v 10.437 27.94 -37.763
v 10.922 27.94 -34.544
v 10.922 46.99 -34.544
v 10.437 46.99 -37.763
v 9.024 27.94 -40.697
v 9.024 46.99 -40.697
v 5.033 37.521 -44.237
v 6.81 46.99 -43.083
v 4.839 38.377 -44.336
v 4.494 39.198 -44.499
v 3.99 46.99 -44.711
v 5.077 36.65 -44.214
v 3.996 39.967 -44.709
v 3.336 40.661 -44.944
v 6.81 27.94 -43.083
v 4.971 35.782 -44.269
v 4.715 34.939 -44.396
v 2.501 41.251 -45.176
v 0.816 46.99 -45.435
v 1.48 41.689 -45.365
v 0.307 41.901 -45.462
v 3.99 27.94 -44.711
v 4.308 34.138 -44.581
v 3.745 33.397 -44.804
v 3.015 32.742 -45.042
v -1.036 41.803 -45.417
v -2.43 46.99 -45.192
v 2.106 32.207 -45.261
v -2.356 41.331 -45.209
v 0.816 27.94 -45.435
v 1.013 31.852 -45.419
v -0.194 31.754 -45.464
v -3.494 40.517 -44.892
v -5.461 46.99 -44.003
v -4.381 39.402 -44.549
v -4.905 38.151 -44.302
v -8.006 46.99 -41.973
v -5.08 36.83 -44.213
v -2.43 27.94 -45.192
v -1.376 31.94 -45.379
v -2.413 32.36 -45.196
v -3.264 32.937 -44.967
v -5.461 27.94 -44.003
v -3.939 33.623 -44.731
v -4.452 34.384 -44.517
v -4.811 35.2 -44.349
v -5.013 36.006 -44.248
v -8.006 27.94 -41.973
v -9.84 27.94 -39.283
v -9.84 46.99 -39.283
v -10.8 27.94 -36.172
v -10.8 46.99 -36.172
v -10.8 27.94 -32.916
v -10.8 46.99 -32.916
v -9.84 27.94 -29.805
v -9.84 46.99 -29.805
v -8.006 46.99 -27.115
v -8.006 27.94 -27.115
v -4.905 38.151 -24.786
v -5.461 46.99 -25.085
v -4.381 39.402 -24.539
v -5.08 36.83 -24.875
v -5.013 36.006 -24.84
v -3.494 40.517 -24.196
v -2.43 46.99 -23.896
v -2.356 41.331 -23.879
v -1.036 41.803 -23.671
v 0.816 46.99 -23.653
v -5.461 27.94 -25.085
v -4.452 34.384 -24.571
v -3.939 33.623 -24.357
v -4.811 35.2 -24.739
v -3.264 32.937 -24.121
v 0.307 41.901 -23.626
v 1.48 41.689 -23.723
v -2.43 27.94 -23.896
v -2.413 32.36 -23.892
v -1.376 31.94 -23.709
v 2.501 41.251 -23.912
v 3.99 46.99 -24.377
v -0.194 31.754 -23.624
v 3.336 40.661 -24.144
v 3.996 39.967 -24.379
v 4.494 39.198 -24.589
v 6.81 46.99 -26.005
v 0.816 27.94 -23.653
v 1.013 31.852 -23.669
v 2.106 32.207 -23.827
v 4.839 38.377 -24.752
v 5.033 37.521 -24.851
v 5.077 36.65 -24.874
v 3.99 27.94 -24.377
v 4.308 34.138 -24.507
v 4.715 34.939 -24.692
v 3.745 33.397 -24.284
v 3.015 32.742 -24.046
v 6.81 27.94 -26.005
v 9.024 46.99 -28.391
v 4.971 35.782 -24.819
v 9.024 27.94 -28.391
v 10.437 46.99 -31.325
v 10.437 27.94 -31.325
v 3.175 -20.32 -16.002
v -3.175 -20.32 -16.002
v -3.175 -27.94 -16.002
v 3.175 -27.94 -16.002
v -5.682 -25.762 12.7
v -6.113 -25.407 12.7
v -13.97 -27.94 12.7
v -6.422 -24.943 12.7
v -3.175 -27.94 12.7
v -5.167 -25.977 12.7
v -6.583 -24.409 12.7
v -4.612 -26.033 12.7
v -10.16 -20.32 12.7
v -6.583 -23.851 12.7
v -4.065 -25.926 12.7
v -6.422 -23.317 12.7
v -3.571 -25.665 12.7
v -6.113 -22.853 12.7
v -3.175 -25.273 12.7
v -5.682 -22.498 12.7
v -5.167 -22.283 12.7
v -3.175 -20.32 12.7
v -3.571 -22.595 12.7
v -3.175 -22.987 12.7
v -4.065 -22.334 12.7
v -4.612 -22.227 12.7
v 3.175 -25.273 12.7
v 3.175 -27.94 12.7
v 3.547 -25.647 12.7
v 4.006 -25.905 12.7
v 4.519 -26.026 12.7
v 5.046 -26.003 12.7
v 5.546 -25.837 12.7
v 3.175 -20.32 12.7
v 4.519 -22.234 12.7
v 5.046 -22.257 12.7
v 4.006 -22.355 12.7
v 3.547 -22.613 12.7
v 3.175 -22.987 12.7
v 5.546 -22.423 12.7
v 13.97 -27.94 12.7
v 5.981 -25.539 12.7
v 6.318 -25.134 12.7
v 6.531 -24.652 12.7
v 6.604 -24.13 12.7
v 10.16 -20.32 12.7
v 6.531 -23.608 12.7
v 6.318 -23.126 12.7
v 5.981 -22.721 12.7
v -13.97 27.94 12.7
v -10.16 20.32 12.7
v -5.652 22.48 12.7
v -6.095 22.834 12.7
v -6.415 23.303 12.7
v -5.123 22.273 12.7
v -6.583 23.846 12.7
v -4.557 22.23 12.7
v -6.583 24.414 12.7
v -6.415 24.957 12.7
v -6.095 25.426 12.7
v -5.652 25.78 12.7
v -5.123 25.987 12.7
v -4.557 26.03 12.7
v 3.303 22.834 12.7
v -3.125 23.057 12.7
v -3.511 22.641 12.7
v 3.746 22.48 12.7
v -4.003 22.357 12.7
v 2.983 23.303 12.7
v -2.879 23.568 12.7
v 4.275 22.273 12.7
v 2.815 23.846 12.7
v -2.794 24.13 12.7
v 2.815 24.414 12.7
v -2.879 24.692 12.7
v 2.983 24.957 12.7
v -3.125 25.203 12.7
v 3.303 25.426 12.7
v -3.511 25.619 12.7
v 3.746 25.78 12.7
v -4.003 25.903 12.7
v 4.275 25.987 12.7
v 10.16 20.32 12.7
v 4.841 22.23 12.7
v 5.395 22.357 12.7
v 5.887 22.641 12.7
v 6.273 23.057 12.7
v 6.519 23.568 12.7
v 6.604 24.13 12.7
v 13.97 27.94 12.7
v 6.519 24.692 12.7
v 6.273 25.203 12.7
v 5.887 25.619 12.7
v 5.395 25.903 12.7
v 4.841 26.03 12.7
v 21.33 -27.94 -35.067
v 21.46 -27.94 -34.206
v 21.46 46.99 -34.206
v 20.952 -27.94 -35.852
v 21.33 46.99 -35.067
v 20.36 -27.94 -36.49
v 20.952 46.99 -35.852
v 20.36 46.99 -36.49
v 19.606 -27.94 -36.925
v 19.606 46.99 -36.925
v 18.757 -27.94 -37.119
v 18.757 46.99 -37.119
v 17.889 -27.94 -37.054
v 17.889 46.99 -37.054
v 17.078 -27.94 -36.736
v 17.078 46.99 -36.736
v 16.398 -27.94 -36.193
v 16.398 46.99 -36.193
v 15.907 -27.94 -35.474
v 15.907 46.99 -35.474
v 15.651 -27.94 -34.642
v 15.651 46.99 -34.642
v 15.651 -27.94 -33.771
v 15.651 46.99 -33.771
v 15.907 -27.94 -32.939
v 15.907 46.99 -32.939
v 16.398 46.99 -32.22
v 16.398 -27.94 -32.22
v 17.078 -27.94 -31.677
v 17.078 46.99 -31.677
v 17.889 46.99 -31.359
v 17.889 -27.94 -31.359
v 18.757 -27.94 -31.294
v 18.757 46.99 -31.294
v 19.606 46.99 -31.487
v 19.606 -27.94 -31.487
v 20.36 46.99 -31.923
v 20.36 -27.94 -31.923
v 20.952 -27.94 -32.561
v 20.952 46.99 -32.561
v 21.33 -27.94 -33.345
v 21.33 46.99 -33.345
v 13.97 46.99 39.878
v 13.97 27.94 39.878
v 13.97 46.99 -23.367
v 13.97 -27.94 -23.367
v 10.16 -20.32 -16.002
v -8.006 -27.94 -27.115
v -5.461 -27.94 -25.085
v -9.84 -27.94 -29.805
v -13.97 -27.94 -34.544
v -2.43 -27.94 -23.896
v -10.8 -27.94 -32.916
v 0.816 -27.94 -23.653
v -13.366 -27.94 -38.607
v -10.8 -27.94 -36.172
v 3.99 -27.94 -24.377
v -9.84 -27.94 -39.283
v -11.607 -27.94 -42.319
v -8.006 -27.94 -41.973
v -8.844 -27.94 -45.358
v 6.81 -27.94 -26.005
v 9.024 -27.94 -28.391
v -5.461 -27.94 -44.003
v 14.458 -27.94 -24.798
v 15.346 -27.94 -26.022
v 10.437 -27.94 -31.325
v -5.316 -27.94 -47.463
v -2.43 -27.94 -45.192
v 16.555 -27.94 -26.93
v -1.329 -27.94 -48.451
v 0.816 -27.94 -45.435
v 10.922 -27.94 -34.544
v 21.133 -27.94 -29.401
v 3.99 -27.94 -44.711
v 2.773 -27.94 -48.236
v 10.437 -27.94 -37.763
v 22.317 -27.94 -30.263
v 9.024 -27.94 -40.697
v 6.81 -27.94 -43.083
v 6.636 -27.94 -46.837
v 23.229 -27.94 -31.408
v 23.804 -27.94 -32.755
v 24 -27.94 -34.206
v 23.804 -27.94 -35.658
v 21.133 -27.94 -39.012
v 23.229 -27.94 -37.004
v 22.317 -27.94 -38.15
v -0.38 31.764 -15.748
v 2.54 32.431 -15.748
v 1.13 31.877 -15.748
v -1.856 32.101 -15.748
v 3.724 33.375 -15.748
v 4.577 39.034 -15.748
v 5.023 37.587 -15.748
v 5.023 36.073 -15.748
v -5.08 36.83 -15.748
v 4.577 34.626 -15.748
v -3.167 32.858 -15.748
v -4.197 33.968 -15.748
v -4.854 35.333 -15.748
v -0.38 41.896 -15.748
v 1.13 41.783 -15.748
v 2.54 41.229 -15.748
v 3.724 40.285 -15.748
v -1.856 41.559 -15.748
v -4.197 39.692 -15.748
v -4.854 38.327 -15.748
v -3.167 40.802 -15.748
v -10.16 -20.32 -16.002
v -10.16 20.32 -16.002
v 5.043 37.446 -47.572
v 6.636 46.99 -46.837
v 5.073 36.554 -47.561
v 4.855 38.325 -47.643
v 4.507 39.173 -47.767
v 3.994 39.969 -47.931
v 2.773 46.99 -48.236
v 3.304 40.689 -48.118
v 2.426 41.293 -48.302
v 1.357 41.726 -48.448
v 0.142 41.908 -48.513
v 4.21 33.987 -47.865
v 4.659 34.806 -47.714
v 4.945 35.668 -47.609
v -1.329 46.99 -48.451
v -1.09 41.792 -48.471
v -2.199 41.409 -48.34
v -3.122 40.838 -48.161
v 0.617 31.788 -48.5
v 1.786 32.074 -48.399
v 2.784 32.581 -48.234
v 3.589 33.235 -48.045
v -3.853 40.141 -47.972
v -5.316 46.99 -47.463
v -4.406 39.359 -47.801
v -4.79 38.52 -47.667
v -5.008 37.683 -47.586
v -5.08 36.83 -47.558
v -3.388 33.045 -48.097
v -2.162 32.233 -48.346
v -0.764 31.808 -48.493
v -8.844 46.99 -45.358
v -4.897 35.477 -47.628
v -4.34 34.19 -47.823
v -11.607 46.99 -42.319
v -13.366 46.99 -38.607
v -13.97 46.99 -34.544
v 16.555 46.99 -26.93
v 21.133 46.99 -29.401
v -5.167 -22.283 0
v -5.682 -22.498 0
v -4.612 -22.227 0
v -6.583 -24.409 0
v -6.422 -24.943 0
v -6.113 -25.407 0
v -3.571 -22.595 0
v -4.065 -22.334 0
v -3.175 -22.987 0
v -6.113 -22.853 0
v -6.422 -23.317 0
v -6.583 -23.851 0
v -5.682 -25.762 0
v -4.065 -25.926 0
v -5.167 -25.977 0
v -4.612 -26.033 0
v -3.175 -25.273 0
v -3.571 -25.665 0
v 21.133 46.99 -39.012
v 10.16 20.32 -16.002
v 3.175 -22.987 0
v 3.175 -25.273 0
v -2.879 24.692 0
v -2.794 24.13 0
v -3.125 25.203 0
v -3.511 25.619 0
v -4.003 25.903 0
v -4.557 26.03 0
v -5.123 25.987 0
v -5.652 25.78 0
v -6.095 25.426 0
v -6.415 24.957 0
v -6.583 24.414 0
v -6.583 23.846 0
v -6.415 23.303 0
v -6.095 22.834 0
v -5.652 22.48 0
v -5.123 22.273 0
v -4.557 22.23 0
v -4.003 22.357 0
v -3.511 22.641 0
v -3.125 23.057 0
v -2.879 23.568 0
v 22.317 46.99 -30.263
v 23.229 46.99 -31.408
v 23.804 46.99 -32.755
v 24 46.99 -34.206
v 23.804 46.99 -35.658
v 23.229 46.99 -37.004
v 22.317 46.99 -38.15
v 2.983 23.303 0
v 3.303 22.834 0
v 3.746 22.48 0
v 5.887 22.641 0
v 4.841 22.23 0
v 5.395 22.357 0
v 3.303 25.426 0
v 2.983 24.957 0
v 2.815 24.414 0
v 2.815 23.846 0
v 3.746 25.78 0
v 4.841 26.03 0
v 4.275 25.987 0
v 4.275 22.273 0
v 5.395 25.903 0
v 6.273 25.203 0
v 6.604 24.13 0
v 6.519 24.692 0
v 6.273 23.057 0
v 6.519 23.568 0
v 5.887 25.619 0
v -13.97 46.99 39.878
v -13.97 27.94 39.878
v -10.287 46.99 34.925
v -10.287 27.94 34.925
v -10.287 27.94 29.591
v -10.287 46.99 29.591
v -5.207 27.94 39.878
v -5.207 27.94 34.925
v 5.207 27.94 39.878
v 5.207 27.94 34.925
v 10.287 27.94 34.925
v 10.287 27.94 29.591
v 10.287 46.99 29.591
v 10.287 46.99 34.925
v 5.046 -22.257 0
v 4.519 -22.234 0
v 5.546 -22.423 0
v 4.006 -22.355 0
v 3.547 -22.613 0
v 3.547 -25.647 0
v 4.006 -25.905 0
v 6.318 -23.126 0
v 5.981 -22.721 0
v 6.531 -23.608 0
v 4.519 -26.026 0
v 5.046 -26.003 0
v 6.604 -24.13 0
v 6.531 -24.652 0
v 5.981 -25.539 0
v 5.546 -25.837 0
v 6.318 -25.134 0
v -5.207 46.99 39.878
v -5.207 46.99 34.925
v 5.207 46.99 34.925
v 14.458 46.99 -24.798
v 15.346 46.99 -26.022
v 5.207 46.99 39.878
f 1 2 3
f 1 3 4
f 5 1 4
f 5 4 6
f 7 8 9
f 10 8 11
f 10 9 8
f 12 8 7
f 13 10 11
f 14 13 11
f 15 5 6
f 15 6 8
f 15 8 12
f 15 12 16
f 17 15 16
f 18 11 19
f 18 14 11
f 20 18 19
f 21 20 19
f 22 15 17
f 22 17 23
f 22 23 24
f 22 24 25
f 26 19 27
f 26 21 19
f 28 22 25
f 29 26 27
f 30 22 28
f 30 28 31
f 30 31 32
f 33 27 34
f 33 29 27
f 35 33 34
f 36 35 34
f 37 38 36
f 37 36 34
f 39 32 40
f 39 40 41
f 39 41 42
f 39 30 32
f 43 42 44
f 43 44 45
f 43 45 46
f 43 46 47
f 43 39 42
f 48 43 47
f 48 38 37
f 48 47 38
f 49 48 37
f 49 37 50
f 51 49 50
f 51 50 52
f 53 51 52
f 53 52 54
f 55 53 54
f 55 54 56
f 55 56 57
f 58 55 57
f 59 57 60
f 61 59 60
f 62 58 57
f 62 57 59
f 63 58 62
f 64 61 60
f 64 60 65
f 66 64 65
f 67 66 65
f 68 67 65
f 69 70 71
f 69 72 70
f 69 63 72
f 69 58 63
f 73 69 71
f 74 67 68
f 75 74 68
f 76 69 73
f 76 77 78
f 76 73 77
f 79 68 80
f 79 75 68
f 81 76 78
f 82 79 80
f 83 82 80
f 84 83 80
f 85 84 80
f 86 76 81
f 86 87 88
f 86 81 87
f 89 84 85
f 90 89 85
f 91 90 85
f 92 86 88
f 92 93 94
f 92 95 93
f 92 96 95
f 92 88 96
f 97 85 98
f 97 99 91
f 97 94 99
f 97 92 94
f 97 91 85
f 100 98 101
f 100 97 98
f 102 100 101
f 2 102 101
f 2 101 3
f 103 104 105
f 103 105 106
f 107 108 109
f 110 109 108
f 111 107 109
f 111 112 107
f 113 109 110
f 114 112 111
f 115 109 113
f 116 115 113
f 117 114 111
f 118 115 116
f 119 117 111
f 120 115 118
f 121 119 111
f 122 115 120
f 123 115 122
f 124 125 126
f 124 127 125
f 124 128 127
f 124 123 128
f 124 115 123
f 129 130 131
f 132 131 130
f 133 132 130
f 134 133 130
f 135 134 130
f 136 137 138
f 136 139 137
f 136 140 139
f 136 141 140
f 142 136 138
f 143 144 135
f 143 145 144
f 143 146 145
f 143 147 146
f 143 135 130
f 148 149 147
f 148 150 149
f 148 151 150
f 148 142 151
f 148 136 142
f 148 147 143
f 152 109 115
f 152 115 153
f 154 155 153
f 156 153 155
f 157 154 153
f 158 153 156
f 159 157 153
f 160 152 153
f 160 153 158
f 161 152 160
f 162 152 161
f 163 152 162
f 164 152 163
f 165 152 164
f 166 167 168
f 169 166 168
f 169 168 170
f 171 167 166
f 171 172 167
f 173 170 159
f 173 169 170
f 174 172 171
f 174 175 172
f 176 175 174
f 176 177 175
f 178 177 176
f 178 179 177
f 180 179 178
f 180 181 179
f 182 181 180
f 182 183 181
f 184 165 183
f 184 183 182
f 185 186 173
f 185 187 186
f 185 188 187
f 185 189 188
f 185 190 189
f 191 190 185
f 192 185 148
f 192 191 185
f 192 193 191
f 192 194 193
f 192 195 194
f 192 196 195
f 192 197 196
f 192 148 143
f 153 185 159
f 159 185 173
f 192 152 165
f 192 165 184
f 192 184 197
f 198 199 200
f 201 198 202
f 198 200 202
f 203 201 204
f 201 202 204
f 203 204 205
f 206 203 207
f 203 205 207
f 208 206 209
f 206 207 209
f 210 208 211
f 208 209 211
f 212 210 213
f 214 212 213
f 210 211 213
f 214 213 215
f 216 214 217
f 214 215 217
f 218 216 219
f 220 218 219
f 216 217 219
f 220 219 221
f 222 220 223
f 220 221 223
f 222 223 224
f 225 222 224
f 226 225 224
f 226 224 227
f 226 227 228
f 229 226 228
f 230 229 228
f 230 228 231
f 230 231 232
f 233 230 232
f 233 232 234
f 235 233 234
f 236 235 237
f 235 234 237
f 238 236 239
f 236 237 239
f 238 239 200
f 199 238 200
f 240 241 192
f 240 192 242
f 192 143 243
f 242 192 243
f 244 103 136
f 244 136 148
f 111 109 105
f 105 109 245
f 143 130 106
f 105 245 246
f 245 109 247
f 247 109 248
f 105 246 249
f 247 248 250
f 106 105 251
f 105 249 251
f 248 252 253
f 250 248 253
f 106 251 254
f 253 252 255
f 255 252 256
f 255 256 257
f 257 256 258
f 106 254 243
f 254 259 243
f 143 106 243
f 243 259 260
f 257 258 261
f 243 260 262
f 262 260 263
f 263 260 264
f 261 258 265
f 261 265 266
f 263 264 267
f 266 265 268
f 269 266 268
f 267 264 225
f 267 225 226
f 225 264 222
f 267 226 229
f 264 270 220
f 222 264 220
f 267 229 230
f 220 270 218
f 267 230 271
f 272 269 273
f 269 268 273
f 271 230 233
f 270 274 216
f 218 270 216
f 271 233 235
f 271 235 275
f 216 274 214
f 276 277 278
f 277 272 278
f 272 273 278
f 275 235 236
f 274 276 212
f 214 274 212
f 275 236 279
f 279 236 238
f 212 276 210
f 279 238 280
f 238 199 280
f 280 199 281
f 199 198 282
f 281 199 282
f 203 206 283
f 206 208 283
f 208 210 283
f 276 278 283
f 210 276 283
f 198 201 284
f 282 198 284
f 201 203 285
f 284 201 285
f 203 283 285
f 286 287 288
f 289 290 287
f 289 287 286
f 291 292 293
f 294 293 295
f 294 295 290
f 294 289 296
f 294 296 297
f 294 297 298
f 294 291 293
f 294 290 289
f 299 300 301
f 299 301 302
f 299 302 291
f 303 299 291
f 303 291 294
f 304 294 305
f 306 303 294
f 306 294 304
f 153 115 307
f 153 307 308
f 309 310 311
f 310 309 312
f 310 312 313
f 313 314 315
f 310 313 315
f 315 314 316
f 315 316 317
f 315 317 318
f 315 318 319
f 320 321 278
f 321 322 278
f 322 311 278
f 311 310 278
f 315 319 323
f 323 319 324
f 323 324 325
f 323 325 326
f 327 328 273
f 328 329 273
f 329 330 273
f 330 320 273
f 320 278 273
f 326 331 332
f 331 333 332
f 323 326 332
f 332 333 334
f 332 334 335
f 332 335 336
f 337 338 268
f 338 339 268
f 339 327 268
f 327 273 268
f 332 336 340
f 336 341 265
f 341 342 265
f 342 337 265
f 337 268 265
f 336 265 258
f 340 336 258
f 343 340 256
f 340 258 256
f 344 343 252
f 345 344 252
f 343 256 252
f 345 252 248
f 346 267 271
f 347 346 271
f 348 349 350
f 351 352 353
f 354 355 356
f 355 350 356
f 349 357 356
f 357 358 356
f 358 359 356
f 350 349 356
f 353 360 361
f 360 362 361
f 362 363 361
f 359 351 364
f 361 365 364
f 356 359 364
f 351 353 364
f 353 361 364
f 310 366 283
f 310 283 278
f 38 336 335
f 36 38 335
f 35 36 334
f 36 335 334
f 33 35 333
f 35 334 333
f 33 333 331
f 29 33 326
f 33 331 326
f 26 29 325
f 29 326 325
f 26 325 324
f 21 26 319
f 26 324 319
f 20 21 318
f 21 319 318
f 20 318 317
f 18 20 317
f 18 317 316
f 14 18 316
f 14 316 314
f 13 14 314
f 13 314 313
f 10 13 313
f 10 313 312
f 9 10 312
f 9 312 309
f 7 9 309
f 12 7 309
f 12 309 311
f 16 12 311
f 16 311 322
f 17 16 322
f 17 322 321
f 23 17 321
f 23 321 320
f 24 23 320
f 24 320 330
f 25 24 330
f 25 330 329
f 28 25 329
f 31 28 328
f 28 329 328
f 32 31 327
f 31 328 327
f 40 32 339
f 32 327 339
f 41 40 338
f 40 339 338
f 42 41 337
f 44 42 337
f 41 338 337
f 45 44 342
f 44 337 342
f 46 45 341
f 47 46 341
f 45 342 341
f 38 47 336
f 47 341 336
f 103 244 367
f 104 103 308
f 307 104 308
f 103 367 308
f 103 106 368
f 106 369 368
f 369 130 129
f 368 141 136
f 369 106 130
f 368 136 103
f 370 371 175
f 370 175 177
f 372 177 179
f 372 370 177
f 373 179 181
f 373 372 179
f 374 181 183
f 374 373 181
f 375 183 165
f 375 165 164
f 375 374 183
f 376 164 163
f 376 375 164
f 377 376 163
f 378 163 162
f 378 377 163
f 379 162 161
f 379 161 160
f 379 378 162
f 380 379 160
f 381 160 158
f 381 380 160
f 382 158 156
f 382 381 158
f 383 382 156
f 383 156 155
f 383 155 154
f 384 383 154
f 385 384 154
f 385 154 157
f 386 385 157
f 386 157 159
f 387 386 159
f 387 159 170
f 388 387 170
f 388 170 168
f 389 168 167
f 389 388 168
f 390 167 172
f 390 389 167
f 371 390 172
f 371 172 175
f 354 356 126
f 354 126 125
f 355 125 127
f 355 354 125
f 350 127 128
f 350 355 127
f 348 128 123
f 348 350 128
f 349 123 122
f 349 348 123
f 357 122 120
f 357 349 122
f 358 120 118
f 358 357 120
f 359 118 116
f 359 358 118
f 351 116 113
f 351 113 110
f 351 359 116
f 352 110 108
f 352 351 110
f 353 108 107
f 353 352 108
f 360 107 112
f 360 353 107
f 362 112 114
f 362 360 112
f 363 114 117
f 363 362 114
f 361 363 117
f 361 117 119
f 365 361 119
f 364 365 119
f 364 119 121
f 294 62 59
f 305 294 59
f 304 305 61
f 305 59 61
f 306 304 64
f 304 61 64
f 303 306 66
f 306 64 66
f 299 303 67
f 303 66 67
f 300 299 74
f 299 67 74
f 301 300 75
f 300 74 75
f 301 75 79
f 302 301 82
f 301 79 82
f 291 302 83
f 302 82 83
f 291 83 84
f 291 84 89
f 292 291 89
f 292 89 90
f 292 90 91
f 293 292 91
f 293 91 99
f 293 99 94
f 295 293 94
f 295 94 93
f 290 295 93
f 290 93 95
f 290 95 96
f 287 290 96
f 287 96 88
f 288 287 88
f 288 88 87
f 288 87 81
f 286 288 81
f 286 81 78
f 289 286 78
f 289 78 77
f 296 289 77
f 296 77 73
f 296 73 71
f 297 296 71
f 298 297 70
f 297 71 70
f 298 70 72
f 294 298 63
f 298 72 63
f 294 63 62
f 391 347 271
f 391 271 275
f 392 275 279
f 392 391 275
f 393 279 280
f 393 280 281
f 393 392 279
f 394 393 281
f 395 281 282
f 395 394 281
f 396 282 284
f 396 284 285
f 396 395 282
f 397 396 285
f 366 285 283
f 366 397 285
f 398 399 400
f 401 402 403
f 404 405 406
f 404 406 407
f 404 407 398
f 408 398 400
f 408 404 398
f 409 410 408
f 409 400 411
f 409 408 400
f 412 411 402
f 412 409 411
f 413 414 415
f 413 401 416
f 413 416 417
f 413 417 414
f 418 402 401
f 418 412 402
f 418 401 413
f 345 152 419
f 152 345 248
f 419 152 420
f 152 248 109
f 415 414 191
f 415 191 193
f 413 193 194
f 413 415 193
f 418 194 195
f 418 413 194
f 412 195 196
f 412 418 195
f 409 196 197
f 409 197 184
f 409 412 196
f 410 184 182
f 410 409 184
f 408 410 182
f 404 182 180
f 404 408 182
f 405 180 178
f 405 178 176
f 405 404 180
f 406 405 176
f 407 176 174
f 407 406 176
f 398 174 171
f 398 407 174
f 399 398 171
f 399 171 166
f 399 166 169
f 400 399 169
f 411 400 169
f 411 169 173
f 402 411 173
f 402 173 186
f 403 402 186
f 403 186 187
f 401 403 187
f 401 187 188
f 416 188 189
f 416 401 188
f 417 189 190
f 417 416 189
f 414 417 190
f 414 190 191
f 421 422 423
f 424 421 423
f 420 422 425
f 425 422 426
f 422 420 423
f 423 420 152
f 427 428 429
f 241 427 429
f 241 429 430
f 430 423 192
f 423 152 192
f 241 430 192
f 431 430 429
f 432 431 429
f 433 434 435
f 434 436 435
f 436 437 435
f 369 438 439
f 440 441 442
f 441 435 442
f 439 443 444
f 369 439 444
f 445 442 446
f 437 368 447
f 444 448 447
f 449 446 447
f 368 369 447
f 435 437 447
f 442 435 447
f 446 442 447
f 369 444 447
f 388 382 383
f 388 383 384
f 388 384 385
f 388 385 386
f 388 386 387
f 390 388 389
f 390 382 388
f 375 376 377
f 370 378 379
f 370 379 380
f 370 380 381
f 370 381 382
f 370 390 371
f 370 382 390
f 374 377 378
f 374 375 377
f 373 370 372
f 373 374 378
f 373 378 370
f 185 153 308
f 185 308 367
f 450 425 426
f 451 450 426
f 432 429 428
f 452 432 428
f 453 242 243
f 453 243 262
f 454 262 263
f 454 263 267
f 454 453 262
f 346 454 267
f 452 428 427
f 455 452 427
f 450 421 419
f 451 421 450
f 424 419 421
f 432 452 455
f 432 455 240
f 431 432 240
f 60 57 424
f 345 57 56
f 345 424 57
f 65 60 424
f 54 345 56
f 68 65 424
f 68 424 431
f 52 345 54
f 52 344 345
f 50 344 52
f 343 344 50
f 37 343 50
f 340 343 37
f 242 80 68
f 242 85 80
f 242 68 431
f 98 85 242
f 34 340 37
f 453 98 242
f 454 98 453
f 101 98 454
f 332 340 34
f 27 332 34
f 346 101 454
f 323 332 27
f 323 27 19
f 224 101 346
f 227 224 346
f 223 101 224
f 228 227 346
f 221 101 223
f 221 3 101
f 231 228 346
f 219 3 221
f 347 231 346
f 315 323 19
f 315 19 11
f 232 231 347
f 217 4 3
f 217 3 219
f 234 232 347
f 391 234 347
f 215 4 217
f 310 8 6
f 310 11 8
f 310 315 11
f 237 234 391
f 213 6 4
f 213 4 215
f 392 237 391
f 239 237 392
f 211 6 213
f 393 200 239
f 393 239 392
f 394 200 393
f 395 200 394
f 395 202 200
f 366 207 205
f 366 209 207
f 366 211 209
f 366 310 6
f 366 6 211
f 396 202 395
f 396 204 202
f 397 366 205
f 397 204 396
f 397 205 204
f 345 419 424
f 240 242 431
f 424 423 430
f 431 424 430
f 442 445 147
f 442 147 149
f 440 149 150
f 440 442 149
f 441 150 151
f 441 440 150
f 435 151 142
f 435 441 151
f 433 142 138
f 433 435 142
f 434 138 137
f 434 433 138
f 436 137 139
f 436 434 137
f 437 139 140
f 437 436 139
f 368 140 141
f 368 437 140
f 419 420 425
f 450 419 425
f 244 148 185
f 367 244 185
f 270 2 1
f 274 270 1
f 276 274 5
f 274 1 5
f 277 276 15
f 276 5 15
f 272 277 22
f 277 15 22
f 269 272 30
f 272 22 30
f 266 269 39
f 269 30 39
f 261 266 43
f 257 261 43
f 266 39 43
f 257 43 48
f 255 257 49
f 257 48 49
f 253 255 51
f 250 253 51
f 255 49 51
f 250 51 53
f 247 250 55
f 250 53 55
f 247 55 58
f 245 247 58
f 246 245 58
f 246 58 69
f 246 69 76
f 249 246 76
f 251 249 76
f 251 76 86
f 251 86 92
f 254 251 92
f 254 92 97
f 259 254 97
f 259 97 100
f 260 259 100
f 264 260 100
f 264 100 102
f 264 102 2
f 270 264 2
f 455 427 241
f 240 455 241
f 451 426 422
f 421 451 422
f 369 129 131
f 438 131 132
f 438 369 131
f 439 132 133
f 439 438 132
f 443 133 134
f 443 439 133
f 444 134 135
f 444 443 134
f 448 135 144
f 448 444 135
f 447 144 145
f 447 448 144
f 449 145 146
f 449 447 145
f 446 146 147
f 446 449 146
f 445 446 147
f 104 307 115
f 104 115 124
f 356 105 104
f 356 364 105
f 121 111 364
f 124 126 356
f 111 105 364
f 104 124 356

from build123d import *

# Parameters (mm, degrees)
SKETCH2_W             = 20.32
SKETCH2_H             = 7.62
SKETCH2_R             = 1.905
BOSS_EXTRUDE1_DEPTH   = 12.7
BOSS_EXTRUDE1_2_DEPTH = 12.7
SKETCH4_W             = 3.81
SKETCH4_H             = 55.88
BOSS_EXTRUDE2_DEPTH   = 28.702
SKETCH5_W             = 27.94
SKETCH5_H             = 55.88
BOSS_EXTRUDE3_DEPTH   = 7.62
SKETCH6_R             = 10.922
BOSS_EXTRUDE6_DEPTH   = 55.88
SKETCH10_W            = 20.32
SKETCH10_H            = 16.002
BOSS_EXTRUDE7_DEPTH   = 7.62
SKETCH11_W            = 20.32
SKETCH11_H            = 16.002
BOSS_EXTRUDE8_DEPTH   = 7.62
SKETCH12_R            = 10.922
BOSS_EXTRUDE9_DEPTH   = 19.05
SKETCH14_R            = 2.921
BOSS_EXTRUDE10_DEPTH  = 74.93
SKETCH17_R            = 5.08
CUT_EXTRUDE3_DEPTH    = 32.766
SKETCH18_W            = 6.35
SKETCH18_H            = 7.62
CUT_EXTRUDE4_DEPTH    = 28.702


with BuildPart() as part:
    # Sketch2 → Boss-Extrude1 (new body)
    with BuildSketch(Plane.XY):
        with Locations((0, 24.13)):
            Rectangle(SKETCH2_W, SKETCH2_H)
        with Locations((4.699, 24.13)):
            Circle(SKETCH2_R, mode=Mode.SUBTRACT)
        with Locations((-4.699, 24.13)):
            Circle(SKETCH2_R, mode=Mode.SUBTRACT)
    extrude(amount=BOSS_EXTRUDE1_DEPTH)



with BuildPart() as body_2:
    # Sketch2 → Boss-Extrude1 2 (new body)
    with BuildSketch(Plane.XY):
        with Locations((0, -24.13)):
            Rectangle(SKETCH2_W, SKETCH2_H)
        with Locations((-4.699, -24.13)):
            Circle(SKETCH2_R, mode=Mode.SUBTRACT)
        with Locations((4.699, -24.13)):
            Circle(SKETCH2_R, mode=Mode.SUBTRACT)
    extrude(amount=BOSS_EXTRUDE1_2_DEPTH)


with BuildPart() as part_1:
    add(part.part)

    add(body_2.part)  # Boss-Extrude2 merges body 2
    # Sketch4 → Boss-Extrude2 (add)
    with BuildSketch(Plane.XY.offset(12.7)):
        with Locations((-12.065, 0)):
            Rectangle(SKETCH4_W, SKETCH4_H)
        with Locations((12.065, 0)):
            Rectangle(SKETCH4_W, SKETCH4_H)
    extrude(amount=-BOSS_EXTRUDE2_DEPTH)

    # Sketch5 → Boss-Extrude3 (add)
    with BuildSketch(Plane(origin=(0, 0, -16.002), x_dir=(-1, 0, 0), z_dir=(0, 0, -1))):
        Rectangle(SKETCH5_W, SKETCH5_H)
    extrude(amount=BOSS_EXTRUDE3_DEPTH)

    # Sketch6 → Boss-Extrude6 (add)
    with BuildSketch(Plane(origin=(0, 27.94, 0), x_dir=(1, 0, 0), z_dir=(0, 1, 0))):
        with BuildLine():
            Line((8.710385525, 23.622), (13.97, 23.622))
            Line((13.97, 23.622), (13.97, 34.544))
            ThreePointArc((13.97, 34.544), (0, 48.514), (-13.97, 34.544))
            Line((-13.97, 34.544), (-13.97, 23.622))
            Line((-13.97, 23.622), (-8.710385525, 23.622))
            ThreePointArc((-8.710385525, 23.622), (0, 20.574), (8.710385525, 23.622))
        make_face()
        with Locations((0, 34.544)):
            Circle(SKETCH6_R, mode=Mode.SUBTRACT)
    extrude(amount=-BOSS_EXTRUDE6_DEPTH)

    # Sketch10 → Boss-Extrude7 (add)
    with BuildSketch(Plane(origin=(0, 27.94, 0), x_dir=(1, 0, 0), z_dir=(0, 1, 0))):
        with Locations((0, 8.001)):
            Rectangle(SKETCH10_W, SKETCH10_H)
    extrude(amount=-BOSS_EXTRUDE7_DEPTH)

    # Sketch11 → Boss-Extrude8 (add)
    with BuildSketch(Plane.XZ.offset(27.94)):
        with Locations((0, -8.001)):
            Rectangle(SKETCH11_W, SKETCH11_H)
    extrude(amount=-BOSS_EXTRUDE8_DEPTH)

    # Sketch12 → Boss-Extrude9 (add)
    with BuildSketch(Plane(origin=(0, 27.94, 0), x_dir=(1, 0, 0), z_dir=(0, 1, 0))):
        Polygon((-13.97, -12.7), (-13.97, -39.878), (-5.207, -39.878), (-5.207, -34.925), (-10.287, -34.925), (-10.287, -29.591), (10.287, -29.591), (10.287, -34.925), (5.207, -34.925), (5.207, -39.878), (13.97, -39.878), (13.97, -12.7), align=None)
        with BuildLine():
            Line((13.97, -12.7), (13.97, 34.544))
            ThreePointArc((13.97, 34.544), (0, 48.514), (-13.97, 34.544))
            Line((-13.97, 34.544), (-13.97, -12.7))
            Line((-13.97, -12.7), (13.97, -12.7))
        make_face()
        with Locations((0, 34.544)):
            Circle(SKETCH12_R, mode=Mode.SUBTRACT)
    extrude(amount=BOSS_EXTRUDE9_DEPTH)

    # Sketch14 → Boss-Extrude10 (add)
    with BuildSketch(Plane(origin=(0, 46.99, 0), x_dir=(1, 0, 0), z_dir=(0, 1, 0))):
        with BuildLine():
            Line((21.132926123, 39.011999157), (6.635812906, 46.837367605))
            ThreePointArc((6.635812906, 46.837367605), (11.997149793, 41.701464415), (13.97, 34.544))
            Line((13.97, 34.544), (13.97, 26.397222721))
            Line((13.97, 26.397222721), (13.97, 23.366509606))
            ThreePointArc((13.97, 23.366509606), (14.856612526, 25.442827777), (16.555367234, 26.929909268))
            Line((16.555367234, 26.929909268), (21.132926123, 29.400820847))
            ThreePointArc((21.132926123, 29.400820847), (23.999926533, 34.206410002), (21.132926123, 39.011999157))
        make_face()
        with Locations((18.538926533, 34.206410002)):
            Circle(SKETCH14_R, mode=Mode.SUBTRACT)
    extrude(amount=-BOSS_EXTRUDE10_DEPTH)

    # Sketch17 → Cut-Extrude3 (cut)
    with BuildSketch(Plane(origin=(0, 0, -48.514), x_dir=(-1, 0, 0), z_dir=(0, 0, -1))):
        with Locations((0, 36.83)):
            Circle(SKETCH17_R)
    extrude(amount=-CUT_EXTRUDE3_DEPTH, mode=Mode.SUBTRACT)

    # Sketch18 → Cut-Extrude4 (cut)
    with BuildSketch(Plane.XY.offset(12.7)):
        with Locations((0, -24.13)):
            Rectangle(SKETCH18_W, SKETCH18_H)
    extrude(amount=-CUT_EXTRUDE4_DEPTH, mode=Mode.SUBTRACT)


solid = part_1.part
